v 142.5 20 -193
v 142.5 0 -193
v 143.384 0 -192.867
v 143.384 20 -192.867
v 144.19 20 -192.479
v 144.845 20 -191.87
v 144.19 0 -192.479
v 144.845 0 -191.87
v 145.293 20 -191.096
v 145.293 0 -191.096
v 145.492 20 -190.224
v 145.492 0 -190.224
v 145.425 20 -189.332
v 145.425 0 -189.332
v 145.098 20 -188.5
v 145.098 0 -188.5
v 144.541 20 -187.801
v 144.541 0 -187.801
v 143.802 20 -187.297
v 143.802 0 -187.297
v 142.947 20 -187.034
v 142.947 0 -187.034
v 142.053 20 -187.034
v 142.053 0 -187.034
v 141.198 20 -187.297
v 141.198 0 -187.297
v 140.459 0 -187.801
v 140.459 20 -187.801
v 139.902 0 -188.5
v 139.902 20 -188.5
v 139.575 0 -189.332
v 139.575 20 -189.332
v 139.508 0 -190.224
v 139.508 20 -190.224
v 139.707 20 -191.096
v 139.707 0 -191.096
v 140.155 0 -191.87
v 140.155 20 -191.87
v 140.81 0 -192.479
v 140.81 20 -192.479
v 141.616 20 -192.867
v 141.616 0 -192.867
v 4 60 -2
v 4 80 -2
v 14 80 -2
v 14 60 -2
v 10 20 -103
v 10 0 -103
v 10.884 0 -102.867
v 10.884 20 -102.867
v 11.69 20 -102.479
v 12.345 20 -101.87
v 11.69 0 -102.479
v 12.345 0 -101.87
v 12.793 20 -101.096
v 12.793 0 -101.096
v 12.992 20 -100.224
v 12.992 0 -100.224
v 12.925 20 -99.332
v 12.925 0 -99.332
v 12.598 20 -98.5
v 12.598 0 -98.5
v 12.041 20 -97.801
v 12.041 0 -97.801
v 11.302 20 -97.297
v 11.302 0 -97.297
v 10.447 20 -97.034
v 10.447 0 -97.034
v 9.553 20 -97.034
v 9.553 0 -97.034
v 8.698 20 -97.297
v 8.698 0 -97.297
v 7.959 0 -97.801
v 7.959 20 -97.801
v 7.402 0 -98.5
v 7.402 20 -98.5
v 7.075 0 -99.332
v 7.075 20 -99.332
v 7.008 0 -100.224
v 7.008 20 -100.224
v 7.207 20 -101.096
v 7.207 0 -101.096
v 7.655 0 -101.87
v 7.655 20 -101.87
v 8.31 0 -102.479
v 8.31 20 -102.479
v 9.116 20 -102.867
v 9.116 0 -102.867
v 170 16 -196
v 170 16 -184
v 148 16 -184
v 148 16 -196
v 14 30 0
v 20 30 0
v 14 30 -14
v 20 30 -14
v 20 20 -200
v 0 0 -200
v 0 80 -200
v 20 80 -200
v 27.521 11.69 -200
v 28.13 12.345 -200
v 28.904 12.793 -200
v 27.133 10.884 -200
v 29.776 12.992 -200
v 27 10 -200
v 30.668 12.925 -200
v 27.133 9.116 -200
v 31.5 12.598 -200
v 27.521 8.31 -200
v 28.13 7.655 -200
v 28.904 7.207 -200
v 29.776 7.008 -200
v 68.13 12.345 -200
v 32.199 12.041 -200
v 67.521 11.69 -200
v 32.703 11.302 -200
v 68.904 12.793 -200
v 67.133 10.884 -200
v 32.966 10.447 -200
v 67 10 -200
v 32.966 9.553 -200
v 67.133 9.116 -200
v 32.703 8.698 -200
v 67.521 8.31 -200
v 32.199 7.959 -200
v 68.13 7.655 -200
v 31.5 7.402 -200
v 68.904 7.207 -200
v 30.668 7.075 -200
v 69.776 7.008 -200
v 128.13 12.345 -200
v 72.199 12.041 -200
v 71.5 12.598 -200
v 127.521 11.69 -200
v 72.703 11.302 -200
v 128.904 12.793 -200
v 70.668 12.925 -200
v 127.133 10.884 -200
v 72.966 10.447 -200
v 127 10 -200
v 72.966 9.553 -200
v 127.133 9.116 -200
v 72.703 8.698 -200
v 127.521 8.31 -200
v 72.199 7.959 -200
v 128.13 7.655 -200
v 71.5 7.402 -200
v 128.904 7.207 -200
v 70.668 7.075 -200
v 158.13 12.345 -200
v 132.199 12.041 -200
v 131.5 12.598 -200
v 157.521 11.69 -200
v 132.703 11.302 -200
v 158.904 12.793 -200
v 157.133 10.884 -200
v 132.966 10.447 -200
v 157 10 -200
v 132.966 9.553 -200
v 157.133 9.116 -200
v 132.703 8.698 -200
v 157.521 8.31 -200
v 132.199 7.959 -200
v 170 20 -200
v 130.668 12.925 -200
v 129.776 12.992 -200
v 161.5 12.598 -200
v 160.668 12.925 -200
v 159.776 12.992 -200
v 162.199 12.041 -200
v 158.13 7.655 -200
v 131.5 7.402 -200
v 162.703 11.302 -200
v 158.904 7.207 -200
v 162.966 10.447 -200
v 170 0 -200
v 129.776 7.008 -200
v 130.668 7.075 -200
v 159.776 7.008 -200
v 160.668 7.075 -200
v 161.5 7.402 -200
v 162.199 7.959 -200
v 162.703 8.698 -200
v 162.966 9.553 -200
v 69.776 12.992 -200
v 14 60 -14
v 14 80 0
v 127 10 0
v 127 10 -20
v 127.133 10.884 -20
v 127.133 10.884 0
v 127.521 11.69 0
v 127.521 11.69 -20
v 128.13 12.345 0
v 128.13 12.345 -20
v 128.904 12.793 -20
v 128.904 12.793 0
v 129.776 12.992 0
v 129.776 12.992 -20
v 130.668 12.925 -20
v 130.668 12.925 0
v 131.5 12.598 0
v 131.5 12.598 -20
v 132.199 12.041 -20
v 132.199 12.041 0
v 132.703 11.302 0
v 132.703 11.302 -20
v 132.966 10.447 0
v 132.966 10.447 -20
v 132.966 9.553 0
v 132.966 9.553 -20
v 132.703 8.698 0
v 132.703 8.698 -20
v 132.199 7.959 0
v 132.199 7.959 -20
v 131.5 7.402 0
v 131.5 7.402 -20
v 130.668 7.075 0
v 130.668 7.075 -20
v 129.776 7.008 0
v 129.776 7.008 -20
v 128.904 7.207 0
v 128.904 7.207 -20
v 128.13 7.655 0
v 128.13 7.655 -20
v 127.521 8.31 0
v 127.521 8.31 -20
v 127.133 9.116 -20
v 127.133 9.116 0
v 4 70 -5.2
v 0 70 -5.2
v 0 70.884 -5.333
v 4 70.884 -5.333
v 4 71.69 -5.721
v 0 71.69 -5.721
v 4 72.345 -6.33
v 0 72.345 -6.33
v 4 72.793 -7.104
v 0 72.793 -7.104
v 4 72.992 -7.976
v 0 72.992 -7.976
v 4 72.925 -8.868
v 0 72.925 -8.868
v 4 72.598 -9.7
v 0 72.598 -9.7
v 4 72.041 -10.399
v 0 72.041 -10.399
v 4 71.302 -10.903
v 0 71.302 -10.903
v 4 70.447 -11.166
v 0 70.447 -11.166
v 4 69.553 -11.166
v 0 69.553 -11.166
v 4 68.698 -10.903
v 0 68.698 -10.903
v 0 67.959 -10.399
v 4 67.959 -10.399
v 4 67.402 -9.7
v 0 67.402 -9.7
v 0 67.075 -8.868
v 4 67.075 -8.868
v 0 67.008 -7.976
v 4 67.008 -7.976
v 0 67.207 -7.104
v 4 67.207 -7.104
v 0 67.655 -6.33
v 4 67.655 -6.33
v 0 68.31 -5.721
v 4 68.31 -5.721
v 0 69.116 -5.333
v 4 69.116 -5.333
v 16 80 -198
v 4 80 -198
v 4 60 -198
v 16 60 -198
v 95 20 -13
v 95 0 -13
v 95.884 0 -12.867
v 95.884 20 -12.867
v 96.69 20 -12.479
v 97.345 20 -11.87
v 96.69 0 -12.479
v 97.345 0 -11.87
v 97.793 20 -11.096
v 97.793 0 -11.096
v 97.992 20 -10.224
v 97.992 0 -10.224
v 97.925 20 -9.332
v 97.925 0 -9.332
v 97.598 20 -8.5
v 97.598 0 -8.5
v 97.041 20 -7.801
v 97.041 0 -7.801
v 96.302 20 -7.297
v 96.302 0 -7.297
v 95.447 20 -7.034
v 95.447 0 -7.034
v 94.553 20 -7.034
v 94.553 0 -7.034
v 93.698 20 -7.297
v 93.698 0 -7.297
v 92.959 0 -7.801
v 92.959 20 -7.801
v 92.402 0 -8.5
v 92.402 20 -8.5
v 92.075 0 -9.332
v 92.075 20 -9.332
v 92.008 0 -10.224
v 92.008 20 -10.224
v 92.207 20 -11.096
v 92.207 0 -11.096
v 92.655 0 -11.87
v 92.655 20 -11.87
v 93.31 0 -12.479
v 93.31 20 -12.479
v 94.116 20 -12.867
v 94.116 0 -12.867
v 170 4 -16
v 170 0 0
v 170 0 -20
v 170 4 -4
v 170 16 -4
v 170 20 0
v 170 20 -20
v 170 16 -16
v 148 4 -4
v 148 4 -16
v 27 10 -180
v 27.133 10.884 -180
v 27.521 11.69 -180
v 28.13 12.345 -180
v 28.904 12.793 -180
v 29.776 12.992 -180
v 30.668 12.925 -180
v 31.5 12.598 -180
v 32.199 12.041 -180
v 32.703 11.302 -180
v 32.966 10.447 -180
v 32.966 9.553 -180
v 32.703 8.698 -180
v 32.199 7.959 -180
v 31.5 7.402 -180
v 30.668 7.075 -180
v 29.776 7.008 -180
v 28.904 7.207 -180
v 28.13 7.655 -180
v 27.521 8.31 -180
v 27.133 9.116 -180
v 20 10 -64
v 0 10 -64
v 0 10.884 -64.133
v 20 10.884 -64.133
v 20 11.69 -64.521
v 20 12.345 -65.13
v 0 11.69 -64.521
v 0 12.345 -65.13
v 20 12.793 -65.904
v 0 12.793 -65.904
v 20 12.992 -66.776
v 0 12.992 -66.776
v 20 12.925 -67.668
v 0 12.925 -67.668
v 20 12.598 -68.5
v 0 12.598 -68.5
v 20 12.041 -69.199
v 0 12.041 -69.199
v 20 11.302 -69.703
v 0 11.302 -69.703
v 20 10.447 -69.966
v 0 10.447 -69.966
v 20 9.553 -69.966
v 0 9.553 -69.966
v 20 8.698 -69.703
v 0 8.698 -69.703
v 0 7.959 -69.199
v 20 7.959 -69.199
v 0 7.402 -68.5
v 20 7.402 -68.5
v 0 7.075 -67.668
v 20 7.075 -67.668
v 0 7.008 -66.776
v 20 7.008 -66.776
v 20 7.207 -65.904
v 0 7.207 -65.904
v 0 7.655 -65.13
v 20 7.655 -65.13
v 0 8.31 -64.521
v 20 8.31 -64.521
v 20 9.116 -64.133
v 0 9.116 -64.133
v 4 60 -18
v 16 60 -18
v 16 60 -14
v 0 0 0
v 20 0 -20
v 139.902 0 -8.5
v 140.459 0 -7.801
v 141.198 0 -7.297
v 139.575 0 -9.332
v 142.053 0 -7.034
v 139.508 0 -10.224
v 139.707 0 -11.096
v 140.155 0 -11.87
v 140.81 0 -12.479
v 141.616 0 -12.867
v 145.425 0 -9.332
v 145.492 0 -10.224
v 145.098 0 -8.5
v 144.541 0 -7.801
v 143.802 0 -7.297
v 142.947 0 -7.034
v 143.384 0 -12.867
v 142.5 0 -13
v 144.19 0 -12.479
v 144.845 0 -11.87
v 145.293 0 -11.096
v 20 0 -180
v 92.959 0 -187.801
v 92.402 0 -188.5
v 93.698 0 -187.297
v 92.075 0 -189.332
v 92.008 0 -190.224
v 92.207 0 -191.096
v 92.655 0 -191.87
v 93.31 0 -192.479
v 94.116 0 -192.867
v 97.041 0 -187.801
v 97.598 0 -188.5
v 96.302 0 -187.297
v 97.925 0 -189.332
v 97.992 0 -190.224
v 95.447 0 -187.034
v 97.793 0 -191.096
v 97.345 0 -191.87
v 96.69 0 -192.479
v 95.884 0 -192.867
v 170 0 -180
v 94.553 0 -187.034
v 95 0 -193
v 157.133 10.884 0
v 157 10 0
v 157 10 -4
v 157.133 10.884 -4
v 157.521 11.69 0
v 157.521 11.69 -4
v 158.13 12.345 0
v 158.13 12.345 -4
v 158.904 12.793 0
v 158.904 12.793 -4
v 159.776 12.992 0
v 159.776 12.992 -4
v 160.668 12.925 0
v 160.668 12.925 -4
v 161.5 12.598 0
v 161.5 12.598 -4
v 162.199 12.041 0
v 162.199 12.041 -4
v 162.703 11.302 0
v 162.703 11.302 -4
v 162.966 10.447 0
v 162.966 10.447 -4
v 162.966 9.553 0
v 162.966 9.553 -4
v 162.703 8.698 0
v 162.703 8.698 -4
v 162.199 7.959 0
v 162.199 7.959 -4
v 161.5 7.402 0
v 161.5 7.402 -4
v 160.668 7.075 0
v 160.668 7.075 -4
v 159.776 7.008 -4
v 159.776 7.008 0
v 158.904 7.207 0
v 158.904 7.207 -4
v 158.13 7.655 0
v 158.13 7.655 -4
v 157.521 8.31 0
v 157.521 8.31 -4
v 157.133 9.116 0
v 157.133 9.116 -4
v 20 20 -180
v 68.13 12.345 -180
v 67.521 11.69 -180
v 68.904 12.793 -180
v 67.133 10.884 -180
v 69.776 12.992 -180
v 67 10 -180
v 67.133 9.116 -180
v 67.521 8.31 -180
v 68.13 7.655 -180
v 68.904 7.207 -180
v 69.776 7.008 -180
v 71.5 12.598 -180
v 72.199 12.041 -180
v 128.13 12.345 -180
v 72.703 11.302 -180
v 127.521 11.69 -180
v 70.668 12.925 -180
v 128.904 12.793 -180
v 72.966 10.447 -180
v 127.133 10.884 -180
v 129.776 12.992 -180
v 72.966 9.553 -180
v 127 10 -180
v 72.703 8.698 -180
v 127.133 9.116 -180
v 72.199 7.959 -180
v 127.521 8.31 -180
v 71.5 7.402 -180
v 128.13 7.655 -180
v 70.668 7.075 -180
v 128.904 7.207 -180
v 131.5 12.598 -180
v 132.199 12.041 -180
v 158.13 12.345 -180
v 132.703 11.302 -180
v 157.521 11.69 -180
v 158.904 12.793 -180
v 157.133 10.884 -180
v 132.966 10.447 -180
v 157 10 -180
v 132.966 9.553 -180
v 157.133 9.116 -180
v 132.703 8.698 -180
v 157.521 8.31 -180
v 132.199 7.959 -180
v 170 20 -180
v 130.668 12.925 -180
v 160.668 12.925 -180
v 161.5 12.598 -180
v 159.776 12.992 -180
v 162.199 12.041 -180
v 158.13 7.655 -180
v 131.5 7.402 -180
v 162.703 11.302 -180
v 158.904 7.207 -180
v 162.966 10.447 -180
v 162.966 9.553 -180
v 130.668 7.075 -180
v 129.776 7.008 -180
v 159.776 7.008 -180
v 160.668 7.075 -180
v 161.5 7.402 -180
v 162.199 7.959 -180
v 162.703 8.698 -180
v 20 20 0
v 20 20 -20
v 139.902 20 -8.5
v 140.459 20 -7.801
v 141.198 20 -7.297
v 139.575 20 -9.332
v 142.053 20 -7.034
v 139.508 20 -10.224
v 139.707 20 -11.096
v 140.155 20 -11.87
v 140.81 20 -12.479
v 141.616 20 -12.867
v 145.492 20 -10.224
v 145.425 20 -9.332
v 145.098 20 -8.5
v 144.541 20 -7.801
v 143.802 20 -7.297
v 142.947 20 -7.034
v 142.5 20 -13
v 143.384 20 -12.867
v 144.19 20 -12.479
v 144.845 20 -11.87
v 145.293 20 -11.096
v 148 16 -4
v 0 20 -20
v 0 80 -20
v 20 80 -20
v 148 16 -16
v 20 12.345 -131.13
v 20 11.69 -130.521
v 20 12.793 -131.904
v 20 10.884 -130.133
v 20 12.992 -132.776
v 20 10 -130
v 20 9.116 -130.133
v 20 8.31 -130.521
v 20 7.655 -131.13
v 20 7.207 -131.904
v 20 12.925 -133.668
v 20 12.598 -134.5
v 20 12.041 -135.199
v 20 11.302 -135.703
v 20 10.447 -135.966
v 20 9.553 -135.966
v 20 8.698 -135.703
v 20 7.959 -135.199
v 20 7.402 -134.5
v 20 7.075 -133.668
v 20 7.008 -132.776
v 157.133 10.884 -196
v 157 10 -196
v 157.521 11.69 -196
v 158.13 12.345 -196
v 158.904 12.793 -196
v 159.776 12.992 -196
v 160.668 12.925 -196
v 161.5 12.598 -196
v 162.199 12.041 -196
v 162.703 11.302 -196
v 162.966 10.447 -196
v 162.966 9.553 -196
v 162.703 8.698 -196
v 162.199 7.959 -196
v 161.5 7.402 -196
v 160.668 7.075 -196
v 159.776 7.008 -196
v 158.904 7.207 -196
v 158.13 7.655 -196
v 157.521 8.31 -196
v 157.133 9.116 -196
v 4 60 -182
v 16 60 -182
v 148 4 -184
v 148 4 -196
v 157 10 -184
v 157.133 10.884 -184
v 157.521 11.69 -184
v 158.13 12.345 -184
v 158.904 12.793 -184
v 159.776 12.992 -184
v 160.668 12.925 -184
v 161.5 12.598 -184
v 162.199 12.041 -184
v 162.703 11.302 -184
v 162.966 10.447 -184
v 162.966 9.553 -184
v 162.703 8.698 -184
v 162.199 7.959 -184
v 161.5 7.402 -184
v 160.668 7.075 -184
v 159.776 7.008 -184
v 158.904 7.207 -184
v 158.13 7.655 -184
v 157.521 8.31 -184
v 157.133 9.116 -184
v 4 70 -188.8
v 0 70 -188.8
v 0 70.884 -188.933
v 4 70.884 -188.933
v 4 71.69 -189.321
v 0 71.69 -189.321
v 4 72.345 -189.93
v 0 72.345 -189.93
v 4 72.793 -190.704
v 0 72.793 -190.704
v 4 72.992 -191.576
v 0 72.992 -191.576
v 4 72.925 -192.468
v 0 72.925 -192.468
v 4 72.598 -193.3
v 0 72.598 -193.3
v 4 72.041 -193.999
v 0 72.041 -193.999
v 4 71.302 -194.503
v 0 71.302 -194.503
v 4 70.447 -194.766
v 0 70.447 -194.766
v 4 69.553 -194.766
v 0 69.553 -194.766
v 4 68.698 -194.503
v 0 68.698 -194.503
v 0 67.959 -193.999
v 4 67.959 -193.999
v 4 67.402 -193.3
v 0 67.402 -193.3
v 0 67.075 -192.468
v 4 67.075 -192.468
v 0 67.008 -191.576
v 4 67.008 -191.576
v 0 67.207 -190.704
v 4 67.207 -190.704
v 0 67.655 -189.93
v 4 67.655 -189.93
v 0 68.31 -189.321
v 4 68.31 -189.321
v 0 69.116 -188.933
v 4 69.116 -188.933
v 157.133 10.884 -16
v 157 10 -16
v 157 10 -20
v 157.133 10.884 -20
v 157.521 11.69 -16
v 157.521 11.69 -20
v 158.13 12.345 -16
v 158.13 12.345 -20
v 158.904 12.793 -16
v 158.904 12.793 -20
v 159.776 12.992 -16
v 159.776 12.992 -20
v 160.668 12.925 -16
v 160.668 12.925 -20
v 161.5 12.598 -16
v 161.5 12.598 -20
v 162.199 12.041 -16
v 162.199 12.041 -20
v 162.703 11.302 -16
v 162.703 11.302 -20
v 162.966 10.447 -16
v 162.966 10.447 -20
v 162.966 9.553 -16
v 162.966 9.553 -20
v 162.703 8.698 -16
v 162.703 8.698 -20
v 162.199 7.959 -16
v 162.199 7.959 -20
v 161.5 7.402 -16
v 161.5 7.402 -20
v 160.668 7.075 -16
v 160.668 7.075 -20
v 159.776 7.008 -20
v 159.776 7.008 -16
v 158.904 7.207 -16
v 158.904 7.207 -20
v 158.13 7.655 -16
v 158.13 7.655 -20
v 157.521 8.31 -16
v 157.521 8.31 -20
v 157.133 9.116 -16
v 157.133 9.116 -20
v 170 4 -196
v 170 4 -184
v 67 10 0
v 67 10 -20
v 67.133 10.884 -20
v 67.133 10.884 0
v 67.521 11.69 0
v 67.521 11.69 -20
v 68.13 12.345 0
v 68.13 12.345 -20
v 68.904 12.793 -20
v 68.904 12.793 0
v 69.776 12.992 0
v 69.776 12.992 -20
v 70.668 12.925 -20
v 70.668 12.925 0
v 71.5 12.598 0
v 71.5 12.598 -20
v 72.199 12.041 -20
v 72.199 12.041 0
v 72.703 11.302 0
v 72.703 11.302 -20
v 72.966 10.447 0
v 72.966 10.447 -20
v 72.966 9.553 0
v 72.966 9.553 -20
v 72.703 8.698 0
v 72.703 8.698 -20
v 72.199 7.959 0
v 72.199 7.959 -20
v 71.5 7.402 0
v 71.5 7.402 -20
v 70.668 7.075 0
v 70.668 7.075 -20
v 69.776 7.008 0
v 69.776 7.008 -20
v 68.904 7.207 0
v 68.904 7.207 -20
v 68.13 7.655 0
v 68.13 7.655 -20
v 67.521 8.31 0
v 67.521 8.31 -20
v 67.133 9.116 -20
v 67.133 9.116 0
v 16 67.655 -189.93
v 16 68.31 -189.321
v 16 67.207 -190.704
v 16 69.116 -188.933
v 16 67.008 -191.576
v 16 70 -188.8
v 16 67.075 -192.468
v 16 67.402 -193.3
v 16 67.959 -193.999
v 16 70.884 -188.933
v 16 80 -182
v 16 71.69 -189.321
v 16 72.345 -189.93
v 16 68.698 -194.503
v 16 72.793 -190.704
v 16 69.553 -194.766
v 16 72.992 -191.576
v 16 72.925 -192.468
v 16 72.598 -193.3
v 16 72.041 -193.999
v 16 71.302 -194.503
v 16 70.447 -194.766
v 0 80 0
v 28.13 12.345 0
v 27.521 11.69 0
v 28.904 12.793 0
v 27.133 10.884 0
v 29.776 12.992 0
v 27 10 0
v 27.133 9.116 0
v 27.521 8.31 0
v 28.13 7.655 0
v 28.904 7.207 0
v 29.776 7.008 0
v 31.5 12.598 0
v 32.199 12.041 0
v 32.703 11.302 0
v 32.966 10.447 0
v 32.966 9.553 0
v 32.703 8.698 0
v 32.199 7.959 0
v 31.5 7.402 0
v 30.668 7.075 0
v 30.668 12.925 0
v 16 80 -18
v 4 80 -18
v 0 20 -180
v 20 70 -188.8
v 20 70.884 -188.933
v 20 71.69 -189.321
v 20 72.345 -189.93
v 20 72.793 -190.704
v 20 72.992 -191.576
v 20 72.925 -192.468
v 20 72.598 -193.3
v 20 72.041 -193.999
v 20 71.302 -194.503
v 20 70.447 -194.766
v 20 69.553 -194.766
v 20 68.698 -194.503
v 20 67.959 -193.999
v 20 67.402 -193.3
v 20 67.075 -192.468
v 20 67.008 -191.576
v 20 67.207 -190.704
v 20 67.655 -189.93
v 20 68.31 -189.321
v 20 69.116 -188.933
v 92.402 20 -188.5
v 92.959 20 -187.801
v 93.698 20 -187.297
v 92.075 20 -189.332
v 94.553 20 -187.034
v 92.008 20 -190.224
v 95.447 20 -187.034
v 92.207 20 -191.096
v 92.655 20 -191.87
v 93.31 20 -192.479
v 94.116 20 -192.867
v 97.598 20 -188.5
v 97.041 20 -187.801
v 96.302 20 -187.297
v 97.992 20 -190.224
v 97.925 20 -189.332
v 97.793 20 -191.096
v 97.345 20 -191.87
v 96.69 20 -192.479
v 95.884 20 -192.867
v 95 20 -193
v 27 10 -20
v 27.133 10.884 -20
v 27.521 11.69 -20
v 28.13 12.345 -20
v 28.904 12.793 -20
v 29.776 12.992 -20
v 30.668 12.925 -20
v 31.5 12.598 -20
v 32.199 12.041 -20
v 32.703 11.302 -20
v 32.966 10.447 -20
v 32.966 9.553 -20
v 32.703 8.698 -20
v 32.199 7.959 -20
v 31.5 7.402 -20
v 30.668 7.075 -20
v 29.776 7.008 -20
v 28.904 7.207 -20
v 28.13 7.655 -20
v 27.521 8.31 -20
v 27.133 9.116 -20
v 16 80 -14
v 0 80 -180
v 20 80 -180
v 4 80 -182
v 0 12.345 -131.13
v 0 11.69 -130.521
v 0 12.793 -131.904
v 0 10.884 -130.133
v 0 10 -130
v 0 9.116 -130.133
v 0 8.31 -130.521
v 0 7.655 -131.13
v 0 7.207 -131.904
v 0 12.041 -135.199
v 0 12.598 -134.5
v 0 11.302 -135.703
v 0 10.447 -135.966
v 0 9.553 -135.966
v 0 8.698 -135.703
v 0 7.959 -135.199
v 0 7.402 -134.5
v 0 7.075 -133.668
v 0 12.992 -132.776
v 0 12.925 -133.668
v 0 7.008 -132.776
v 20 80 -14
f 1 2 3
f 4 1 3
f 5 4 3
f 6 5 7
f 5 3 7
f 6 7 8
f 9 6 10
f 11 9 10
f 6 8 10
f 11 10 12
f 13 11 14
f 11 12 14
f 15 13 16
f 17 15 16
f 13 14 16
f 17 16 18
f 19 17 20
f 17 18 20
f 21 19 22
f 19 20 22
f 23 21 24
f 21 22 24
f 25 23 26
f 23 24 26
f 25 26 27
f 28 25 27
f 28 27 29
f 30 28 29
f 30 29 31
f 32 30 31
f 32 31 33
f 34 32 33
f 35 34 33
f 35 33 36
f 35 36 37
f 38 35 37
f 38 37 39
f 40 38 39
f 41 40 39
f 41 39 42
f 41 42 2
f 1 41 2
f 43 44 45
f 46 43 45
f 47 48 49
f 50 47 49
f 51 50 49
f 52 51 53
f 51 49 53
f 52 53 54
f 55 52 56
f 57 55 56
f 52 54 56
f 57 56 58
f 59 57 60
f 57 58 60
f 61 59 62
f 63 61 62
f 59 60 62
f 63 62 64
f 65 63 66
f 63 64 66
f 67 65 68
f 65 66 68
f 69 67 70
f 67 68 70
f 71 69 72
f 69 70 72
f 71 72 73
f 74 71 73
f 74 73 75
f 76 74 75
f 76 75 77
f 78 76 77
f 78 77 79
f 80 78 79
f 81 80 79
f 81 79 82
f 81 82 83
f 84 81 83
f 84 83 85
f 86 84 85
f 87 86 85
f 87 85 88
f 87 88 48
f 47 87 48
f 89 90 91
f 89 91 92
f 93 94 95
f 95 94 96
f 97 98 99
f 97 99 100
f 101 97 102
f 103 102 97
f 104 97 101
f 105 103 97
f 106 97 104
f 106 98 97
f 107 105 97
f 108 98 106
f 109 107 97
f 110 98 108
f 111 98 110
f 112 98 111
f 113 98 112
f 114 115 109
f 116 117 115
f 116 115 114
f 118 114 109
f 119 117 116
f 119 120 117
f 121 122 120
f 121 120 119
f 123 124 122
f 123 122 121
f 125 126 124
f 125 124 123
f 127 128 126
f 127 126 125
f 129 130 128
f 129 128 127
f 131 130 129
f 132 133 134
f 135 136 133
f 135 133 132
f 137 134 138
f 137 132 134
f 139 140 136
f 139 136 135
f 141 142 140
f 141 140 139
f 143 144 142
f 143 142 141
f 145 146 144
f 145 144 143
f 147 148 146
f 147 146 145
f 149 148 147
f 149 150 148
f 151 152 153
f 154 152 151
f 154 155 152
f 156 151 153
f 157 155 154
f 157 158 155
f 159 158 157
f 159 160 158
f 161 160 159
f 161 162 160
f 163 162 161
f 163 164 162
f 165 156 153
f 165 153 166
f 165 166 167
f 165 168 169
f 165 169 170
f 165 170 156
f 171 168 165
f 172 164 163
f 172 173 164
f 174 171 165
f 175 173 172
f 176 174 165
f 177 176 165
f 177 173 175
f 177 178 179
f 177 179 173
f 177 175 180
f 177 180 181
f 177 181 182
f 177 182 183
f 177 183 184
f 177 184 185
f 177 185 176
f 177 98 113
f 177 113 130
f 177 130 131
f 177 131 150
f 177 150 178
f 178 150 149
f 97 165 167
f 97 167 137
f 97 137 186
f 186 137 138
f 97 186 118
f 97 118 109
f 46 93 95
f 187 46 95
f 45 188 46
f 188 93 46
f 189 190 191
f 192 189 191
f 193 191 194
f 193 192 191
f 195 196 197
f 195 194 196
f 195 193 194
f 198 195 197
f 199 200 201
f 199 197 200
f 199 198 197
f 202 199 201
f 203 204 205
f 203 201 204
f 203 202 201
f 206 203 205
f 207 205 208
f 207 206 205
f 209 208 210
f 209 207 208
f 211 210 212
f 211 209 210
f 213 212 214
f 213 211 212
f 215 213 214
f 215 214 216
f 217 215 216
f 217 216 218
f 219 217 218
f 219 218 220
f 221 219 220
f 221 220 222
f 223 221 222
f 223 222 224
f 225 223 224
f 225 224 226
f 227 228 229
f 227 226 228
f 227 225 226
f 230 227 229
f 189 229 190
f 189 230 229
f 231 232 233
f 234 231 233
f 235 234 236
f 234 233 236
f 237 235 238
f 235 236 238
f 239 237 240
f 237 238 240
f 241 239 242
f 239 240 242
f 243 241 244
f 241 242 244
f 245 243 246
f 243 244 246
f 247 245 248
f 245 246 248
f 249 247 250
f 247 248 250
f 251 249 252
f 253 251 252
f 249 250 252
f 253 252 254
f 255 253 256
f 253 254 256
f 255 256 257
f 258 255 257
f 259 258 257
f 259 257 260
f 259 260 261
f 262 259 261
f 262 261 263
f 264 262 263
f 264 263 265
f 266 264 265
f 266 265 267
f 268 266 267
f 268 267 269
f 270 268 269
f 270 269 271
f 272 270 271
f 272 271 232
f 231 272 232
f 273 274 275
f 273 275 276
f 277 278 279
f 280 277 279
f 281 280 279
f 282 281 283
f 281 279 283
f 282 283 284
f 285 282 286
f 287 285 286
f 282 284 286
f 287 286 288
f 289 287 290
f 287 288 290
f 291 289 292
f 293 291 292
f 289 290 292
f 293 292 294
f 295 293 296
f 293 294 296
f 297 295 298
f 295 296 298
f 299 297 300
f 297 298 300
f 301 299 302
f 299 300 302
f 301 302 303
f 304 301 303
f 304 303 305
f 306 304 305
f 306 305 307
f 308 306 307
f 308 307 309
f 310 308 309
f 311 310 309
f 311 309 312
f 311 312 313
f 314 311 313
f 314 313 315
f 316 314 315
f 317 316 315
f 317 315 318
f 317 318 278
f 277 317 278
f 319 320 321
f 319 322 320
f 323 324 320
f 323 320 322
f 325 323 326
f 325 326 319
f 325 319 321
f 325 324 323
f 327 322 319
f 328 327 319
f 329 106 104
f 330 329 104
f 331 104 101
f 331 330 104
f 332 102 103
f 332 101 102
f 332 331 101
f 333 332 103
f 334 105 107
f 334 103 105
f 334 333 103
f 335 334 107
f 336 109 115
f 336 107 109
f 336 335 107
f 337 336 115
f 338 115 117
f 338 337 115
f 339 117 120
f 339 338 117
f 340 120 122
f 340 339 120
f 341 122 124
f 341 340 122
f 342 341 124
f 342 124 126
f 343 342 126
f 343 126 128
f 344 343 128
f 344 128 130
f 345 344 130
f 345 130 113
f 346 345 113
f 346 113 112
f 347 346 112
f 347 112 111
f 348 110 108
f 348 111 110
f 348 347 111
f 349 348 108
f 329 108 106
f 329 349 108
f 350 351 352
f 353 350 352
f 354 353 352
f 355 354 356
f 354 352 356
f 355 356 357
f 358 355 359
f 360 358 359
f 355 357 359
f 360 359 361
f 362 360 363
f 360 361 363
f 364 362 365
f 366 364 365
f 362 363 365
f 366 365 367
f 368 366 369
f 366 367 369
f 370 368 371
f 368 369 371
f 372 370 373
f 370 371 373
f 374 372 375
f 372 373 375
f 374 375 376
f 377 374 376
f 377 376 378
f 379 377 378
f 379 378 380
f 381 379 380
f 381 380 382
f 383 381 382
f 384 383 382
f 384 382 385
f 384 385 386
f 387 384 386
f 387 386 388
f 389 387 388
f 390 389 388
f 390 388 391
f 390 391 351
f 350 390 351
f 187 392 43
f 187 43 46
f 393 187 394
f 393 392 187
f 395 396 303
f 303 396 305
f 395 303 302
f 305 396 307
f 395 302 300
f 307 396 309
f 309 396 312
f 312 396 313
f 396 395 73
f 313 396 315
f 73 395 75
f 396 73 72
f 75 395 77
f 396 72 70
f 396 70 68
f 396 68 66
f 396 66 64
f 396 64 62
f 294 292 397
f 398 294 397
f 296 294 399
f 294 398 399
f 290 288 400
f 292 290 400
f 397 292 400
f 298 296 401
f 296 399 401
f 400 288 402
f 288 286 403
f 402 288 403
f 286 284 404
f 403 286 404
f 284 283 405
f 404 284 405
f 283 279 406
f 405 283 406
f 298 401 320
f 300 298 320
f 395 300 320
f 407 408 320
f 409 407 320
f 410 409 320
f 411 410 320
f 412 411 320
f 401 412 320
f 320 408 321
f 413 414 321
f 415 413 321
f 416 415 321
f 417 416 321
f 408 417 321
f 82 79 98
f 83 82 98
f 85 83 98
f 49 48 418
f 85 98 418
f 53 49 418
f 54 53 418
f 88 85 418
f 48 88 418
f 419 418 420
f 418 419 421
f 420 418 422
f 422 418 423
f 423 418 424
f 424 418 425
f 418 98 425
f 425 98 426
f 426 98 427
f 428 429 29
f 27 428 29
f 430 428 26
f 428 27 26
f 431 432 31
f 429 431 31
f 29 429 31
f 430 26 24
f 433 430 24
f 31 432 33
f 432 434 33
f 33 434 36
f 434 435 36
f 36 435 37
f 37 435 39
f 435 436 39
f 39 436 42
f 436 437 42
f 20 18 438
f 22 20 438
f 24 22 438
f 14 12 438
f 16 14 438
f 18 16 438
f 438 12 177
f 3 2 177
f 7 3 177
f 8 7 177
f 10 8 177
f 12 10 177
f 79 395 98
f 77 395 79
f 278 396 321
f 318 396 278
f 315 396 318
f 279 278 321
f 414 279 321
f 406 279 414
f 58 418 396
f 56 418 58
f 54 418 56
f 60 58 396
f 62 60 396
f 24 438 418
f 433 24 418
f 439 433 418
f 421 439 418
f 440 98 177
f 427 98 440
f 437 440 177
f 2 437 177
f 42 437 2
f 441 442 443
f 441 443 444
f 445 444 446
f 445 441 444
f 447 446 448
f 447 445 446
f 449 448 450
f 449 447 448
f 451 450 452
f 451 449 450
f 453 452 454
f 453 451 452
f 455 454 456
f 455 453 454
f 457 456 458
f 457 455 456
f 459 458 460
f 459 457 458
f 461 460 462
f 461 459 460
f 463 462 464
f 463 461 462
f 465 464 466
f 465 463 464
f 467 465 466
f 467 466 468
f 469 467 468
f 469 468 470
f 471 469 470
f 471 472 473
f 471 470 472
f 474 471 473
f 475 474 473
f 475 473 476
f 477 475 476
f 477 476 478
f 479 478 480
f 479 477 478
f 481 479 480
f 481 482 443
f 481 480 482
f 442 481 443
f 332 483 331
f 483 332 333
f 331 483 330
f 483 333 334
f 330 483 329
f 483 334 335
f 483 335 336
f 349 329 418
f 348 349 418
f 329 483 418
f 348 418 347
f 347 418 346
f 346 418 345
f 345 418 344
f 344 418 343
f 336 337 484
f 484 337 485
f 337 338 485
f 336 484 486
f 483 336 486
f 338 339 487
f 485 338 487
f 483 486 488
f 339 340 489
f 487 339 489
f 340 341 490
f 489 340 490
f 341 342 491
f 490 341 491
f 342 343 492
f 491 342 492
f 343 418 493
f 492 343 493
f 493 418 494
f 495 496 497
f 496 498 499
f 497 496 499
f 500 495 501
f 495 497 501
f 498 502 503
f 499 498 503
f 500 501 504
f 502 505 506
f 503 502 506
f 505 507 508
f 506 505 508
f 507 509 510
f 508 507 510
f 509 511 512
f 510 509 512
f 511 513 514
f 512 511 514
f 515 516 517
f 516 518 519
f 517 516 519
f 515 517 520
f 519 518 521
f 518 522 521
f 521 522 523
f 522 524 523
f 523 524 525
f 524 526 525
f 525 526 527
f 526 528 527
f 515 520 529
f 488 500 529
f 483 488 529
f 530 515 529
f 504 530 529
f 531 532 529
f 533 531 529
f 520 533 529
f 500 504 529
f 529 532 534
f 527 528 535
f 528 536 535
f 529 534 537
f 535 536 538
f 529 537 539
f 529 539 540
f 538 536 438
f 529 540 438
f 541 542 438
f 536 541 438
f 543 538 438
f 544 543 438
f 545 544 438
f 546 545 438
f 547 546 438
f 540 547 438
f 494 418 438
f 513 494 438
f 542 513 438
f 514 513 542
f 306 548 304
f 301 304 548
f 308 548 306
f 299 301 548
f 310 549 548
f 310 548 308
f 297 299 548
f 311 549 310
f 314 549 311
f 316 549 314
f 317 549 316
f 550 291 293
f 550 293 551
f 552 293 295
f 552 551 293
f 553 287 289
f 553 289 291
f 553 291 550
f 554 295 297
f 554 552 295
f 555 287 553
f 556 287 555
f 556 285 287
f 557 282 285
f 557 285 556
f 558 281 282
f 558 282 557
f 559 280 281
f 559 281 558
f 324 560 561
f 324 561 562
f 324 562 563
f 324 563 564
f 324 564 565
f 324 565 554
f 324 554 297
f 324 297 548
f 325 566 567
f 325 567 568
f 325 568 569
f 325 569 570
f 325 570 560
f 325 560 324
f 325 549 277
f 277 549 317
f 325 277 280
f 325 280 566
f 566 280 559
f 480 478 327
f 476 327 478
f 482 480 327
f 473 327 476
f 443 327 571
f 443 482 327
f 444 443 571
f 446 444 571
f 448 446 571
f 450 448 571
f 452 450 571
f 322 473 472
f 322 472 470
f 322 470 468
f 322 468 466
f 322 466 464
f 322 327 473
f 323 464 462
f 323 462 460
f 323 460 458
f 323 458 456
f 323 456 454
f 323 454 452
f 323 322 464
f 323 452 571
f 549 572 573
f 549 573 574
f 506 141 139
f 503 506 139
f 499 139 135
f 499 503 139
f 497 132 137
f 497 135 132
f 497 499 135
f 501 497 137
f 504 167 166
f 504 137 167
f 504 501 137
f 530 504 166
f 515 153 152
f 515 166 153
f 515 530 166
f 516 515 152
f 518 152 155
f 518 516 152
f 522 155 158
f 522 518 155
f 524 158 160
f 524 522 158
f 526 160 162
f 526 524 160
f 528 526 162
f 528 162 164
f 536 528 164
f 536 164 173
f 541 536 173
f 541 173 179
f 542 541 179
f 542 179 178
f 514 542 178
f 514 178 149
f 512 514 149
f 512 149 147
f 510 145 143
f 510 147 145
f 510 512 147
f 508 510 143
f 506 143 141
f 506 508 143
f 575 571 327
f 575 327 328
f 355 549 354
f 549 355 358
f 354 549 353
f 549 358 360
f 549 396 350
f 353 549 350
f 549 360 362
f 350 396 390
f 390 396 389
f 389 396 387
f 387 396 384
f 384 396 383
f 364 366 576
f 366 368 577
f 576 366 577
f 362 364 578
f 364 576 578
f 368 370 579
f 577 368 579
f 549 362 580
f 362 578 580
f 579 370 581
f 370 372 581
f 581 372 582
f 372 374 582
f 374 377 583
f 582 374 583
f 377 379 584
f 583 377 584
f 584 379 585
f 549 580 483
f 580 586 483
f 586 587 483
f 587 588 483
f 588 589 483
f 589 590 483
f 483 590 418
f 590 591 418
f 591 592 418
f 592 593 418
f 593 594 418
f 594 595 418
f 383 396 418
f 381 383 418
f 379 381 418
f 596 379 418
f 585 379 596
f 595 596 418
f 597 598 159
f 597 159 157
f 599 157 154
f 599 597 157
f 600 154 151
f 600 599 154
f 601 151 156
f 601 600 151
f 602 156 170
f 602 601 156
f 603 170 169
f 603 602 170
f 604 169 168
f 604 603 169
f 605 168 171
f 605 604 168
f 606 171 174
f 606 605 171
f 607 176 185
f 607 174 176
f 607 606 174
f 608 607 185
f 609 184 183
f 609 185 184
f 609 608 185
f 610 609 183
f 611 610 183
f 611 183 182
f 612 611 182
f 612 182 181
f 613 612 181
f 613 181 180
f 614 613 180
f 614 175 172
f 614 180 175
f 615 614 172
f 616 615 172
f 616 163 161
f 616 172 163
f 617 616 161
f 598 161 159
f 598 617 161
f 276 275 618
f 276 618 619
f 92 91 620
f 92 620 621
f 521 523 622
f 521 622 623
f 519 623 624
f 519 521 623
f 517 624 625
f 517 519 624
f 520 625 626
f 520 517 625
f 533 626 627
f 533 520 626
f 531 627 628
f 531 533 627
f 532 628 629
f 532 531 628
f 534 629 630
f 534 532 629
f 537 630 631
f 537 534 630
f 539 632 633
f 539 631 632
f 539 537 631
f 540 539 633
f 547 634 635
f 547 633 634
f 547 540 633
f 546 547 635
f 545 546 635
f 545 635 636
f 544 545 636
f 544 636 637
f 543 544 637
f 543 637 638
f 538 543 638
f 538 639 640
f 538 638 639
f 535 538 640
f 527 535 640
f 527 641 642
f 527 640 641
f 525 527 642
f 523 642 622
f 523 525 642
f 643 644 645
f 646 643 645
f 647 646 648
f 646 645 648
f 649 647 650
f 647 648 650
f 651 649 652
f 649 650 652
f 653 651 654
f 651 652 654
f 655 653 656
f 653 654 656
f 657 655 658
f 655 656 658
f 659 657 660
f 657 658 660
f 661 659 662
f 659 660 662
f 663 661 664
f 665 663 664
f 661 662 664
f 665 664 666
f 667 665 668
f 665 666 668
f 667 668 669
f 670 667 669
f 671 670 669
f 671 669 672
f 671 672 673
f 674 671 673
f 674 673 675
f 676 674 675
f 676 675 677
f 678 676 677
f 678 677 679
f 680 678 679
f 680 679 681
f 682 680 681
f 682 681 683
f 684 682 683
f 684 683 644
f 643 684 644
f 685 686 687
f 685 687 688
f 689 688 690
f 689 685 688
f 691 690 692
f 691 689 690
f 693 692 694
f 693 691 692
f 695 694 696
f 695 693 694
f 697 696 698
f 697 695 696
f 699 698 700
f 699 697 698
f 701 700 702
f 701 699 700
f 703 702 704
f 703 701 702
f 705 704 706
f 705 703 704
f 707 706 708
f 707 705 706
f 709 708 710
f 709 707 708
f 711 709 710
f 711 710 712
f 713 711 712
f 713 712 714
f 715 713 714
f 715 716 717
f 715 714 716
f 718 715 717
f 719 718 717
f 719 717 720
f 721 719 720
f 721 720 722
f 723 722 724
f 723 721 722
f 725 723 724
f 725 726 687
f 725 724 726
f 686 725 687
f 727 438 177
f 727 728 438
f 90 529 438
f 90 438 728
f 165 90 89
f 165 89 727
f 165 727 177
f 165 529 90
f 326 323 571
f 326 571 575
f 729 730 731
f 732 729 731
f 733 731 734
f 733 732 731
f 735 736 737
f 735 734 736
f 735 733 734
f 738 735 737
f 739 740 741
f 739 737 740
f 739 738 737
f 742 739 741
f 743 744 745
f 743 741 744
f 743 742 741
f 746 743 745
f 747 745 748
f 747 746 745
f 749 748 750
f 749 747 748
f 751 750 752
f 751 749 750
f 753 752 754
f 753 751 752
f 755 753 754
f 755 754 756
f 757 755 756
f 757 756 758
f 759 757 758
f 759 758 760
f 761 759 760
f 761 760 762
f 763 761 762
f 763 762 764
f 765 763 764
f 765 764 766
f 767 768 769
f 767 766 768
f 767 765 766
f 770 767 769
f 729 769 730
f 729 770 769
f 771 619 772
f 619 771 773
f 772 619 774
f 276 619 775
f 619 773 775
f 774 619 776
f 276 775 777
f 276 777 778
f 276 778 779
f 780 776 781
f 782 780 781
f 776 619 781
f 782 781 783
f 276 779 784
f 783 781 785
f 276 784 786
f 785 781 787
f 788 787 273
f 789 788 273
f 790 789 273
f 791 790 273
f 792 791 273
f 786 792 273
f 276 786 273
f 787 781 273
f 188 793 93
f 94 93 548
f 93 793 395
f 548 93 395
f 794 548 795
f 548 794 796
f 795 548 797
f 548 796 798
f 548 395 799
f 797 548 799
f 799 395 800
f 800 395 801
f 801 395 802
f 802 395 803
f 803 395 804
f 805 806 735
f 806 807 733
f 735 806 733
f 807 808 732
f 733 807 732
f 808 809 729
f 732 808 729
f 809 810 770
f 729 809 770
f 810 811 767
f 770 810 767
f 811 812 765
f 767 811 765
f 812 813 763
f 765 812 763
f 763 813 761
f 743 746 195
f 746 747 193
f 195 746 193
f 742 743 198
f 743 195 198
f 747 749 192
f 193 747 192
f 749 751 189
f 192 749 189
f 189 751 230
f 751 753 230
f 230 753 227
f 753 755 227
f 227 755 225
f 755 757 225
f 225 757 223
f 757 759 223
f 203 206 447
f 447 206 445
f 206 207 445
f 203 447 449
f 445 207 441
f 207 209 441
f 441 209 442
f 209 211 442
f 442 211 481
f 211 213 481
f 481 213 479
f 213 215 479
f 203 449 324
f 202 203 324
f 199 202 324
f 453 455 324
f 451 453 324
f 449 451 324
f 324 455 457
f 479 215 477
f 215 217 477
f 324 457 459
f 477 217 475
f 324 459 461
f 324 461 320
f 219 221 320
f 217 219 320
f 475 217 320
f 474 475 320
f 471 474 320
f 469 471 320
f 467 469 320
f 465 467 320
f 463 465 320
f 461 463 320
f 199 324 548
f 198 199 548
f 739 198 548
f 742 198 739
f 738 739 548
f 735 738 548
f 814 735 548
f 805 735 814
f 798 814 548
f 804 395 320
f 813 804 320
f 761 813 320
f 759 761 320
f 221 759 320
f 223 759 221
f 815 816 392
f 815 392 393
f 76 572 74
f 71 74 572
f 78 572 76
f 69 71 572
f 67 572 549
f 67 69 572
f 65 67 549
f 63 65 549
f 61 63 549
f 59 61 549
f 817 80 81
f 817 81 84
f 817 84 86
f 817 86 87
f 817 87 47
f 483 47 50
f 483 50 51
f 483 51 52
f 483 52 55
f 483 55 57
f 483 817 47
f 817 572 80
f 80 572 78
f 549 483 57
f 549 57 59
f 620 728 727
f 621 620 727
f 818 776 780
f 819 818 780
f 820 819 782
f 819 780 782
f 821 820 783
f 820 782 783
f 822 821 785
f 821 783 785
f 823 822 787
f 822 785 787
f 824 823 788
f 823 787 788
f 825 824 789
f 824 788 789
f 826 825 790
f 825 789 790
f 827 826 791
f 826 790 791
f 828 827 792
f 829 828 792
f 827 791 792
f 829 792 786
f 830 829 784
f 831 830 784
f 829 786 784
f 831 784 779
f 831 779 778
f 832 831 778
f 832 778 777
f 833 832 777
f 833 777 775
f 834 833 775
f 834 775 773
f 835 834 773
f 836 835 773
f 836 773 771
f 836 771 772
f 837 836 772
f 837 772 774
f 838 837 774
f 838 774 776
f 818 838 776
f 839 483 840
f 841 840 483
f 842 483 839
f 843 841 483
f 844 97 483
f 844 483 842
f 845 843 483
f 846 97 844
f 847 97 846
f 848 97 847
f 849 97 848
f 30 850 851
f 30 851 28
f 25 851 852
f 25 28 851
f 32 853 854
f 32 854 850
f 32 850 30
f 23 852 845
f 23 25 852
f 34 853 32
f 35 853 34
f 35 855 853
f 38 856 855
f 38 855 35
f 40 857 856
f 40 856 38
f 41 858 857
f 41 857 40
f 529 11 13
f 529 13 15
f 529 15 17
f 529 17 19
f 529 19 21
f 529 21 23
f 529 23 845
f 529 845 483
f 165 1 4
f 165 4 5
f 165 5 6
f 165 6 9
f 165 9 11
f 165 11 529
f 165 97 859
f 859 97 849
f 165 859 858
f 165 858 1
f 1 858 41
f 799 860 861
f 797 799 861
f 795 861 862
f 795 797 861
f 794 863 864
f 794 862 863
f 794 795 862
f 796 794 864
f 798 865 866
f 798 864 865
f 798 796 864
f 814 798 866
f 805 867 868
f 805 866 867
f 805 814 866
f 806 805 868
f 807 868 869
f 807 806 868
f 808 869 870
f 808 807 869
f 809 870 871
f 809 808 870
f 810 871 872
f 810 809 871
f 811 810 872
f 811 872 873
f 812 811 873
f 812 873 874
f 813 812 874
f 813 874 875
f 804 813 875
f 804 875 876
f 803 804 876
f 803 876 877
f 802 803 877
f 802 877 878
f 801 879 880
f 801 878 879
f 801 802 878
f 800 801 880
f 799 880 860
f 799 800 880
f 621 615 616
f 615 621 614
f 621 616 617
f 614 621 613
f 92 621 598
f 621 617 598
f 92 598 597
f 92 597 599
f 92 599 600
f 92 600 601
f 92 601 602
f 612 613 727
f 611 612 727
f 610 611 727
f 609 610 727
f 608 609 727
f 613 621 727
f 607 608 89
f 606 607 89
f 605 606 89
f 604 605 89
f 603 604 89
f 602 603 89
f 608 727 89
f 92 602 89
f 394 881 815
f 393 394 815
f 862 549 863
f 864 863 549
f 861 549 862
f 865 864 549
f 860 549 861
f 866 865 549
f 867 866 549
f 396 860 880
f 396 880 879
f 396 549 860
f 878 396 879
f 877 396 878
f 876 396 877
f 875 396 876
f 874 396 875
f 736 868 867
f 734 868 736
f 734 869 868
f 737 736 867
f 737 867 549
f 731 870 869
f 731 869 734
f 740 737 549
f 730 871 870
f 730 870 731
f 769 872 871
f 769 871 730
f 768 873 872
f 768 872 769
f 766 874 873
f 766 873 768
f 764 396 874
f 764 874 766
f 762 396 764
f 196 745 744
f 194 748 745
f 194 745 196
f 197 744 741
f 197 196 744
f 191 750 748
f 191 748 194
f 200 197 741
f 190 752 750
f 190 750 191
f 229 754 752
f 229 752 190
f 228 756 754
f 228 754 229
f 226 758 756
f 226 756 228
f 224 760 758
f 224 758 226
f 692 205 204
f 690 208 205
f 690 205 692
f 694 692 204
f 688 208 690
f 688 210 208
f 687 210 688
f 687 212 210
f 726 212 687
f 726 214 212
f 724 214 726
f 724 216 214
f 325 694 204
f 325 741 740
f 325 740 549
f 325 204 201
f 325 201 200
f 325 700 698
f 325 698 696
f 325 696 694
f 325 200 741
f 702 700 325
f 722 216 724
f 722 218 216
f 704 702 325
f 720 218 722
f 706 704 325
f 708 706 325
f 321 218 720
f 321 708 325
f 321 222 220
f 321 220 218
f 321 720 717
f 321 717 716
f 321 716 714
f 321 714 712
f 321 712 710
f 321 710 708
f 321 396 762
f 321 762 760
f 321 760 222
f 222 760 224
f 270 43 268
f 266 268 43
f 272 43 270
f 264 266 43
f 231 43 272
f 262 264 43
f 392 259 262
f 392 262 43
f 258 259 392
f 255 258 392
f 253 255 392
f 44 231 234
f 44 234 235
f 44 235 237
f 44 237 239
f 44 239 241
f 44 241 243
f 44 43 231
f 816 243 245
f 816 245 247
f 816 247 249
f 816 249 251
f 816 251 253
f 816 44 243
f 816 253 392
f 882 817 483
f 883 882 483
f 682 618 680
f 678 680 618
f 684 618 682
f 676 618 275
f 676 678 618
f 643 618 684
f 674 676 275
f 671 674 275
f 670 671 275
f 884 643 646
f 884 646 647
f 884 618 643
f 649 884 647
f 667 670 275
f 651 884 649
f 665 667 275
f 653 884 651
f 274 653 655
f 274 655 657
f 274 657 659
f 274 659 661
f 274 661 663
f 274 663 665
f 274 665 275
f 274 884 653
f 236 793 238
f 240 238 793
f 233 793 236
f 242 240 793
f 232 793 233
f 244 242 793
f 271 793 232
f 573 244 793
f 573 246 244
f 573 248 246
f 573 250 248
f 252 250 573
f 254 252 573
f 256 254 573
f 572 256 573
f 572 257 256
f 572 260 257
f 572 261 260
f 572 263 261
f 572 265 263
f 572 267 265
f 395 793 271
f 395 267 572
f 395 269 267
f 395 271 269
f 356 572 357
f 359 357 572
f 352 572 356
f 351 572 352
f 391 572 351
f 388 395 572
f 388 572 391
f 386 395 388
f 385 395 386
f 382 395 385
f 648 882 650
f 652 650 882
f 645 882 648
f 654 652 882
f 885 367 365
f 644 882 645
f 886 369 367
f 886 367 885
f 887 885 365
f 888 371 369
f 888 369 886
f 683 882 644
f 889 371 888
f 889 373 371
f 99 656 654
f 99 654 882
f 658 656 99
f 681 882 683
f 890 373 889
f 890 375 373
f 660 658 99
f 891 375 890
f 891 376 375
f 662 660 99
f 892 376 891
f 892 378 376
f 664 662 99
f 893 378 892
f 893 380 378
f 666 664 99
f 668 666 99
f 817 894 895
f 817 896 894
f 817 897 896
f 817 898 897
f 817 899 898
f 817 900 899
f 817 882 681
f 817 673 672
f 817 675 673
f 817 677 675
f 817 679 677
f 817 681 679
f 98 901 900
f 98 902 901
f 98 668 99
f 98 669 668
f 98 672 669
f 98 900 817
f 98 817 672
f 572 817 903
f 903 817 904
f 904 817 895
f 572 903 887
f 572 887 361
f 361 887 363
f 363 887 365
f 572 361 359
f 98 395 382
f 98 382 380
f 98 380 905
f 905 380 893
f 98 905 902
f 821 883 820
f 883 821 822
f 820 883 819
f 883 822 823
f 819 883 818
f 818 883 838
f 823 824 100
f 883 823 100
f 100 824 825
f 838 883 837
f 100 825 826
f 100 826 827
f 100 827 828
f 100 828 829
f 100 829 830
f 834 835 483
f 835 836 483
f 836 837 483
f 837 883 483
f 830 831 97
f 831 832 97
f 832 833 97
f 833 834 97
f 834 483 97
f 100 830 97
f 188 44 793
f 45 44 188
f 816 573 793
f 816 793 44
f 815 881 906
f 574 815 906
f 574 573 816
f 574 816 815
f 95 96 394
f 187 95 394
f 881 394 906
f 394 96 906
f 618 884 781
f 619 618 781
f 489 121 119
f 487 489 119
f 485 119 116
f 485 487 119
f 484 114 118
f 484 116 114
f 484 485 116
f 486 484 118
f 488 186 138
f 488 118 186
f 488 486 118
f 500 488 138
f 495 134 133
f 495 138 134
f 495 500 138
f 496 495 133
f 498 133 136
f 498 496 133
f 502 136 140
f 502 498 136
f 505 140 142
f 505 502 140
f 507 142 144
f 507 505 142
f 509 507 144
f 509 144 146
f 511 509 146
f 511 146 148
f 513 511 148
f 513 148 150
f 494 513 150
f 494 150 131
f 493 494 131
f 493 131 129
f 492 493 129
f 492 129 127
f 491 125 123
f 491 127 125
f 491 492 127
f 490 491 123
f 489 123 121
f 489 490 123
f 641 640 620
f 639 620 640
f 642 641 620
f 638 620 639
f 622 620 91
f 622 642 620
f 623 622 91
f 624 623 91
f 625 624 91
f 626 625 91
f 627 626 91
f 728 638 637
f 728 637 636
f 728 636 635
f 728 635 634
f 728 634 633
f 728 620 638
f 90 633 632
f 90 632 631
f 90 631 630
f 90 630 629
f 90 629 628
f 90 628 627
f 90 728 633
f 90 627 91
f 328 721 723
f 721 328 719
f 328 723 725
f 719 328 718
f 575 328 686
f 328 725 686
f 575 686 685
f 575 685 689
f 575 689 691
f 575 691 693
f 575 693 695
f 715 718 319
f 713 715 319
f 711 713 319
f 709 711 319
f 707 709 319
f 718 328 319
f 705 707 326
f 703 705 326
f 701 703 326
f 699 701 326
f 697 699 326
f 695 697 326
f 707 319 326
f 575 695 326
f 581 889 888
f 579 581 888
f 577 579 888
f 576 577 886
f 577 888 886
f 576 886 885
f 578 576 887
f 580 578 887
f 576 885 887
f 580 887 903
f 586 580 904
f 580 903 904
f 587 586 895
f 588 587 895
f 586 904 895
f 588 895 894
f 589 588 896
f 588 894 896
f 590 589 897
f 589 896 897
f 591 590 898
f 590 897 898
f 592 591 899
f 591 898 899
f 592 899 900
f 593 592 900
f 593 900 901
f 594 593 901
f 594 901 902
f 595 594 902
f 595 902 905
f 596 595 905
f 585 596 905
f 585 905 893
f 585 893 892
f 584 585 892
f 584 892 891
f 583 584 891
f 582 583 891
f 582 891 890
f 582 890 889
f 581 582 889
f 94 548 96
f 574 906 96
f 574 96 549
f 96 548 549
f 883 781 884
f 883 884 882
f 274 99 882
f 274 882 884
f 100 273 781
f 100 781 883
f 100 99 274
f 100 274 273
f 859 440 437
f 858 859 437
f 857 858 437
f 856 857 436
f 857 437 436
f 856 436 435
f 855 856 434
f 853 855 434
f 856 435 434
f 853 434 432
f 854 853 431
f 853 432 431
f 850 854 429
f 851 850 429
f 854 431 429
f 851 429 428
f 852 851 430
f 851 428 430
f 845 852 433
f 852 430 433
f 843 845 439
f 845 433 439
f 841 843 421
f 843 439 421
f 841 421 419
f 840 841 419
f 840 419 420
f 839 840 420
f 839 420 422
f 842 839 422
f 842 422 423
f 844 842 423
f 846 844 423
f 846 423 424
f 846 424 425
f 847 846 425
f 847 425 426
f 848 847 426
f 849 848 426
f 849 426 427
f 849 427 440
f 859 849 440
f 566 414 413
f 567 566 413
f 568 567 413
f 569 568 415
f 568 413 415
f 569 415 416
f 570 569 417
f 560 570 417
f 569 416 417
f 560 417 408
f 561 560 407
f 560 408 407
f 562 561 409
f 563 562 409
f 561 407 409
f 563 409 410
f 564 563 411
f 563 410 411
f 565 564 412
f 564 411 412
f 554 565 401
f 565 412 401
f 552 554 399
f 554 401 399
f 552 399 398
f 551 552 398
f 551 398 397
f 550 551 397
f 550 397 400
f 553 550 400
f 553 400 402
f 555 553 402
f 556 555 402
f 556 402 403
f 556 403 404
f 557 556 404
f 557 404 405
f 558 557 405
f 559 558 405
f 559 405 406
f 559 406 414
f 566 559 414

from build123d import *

# Parameters (mm, degrees)
SKETCH1_W               = 320
SKETCH1_H               = 200
SKETCH1_W_2             = 280
SKETCH1_H_2             = 160
BOSS_EXTRUDE1_DEPTH     = 20
SKETCH2_W               = 150
SKETCH2_H               = 200
CUT_EXTRUDE1_DEPTH      = 20
SKETCH3_W               = 20
SKETCH3_H               = 20
BOSS_EXTRUDE2_DEPTH     = 60
SKETCH4_W               = 12
SKETCH4_H               = 16
CUT_EXTRUDE2_DEPTH      = 20
SKETCH5_W               = 12
SKETCH5_H               = 12
CUT_EXTRUDE3_DEPTH      = 22
CUT_EXTRUDE5_DEPTH      = 275.40845468
CUT_EXTRUDE5_DEPTH_BACK = 275.40845468
SKETCH8_R               = 3
SKETCH10_R              = 3
CUT_EXTRUDE6_DEPTH      = 30
SKETCH11_W              = 14
SKETCH11_H              = 50
CUT_EXTRUDE7_DEPTH      = 6
SKETCH12_R              = 3
CUT_EXTRUDE8_DEPTH      = 26
SKETCH13_R              = 3
CUT_EXTRUDE9_DEPTH      = 26


with BuildPart() as part:
    # Sketch1 → Boss-Extrude1 (new body)
    with BuildSketch(Plane(origin=(0, 0, 0), x_dir=(1, 0, 0), z_dir=(0, 1, 0))):
        with Locations((160, 100)):
            Rectangle(SKETCH1_W, SKETCH1_H)
        with Locations((160, 100)):
            Rectangle(SKETCH1_W_2, SKETCH1_H_2, mode=Mode.SUBTRACT)
    extrude(amount=BOSS_EXTRUDE1_DEPTH)

    # Sketch2 → Cut-Extrude1 (cut)
    with BuildSketch(Plane(origin=(0, 20, 0), x_dir=(1, 0, 0), z_dir=(0, 1, 0))):
        with Locations((245, 100)):
            Rectangle(SKETCH2_W, SKETCH2_H)
    extrude(amount=-CUT_EXTRUDE1_DEPTH, mode=Mode.SUBTRACT)

    # Sketch3 → Boss-Extrude2 (add)
    with BuildSketch(Plane(origin=(0, 20, 0), x_dir=(1, 0, 0), z_dir=(0, 1, 0))):
        with Locations((10, 10)):
            Rectangle(SKETCH3_W, SKETCH3_H)
        with Locations((10, 190)):
            Rectangle(SKETCH3_W, SKETCH3_H)
    extrude(amount=BOSS_EXTRUDE2_DEPTH)

    # Sketch4 → Cut-Extrude2 (cut)
    with BuildSketch(Plane(origin=(0, 80, 0), x_dir=(1, 0, 0), z_dir=(0, 1, 0))):
        with Locations((10, 10)):
            Rectangle(SKETCH4_W, SKETCH4_H)
        with Locations((10, 190)):
            Rectangle(SKETCH4_W, SKETCH4_H)
    extrude(amount=-CUT_EXTRUDE2_DEPTH, mode=Mode.SUBTRACT)

    # Sketch5 → Cut-Extrude3 (cut)
    with BuildSketch(Plane(origin=(170, 0, 0), x_dir=(0, 0, -1), z_dir=(1, 0, 0))):
        with Locations((10, 10)):
            Rectangle(SKETCH5_W, SKETCH5_H)
        with Locations((190, 10)):
            Rectangle(SKETCH5_W, SKETCH5_H)
    extrude(amount=-CUT_EXTRUDE3_DEPTH, mode=Mode.SUBTRACT)

    # Sketch8 → Cut-Extrude5 (cut, two sides: drawn at the far end of the back side and taken through both)
    with BuildSketch(Plane(origin=(0, 0, -200), x_dir=(-1, 0, 0), z_dir=(0, 0, -1)).offset(-CUT_EXTRUDE5_DEPTH_BACK)):
        with Locations((-30, 10)):
            Circle(SKETCH8_R)
        with Locations((-160, 10)):
            Circle(SKETCH8_R)
        with Locations((-70, 10)):
            Circle(SKETCH8_R)
        with Locations((-130, 10)):
            Circle(SKETCH8_R)
    extrude(amount=CUT_EXTRUDE5_DEPTH + CUT_EXTRUDE5_DEPTH_BACK, mode=Mode.SUBTRACT)

    # Sketch10 → Cut-Extrude6 (cut)
    with BuildSketch(Plane.XZ):
        with Locations(Location((142.5, -10, 0), (0, 0, 270))):
            Circle(SKETCH10_R)
        with Locations(Location((95, -10, 0), (0, 0, 270))):
            Circle(SKETCH10_R)
        with Locations(Location((10, -100, 0), (0, 0, 270))):
            Circle(SKETCH10_R)
        with Locations(Location((142.5, -190, 0), (0, 0, 270))):
            Circle(SKETCH10_R)
        with Locations(Location((95, -190, 0), (0, 0, 270))):
            Circle(SKETCH10_R)
    extrude(amount=-CUT_EXTRUDE6_DEPTH, mode=Mode.SUBTRACT)

    # Sketch11 → Cut-Extrude7 (cut)
    with BuildSketch(Plane(origin=(20, 0, 0), x_dir=(0, 0, -1), z_dir=(1, 0, 0))):
        with Locations((7, 55)):
            Rectangle(SKETCH11_W, SKETCH11_H)
    extrude(amount=-CUT_EXTRUDE7_DEPTH, mode=Mode.SUBTRACT)

    # Sketch12 → Cut-Extrude8 (cut)
    with BuildSketch(Plane.ZY):
        with Locations((-133, 10)):
            Circle(SKETCH12_R)
        with Locations((-67, 10)):
            Circle(SKETCH12_R)
    extrude(amount=-CUT_EXTRUDE8_DEPTH, mode=Mode.SUBTRACT)

    # Sketch13 → Cut-Extrude9 (cut)
    with BuildSketch(Plane.ZY):
        with Locations((-191.8, 70)):
            Circle(SKETCH13_R)
        with Locations((-8.2, 70)):
            Circle(SKETCH13_R)
    extrude(amount=-CUT_EXTRUDE9_DEPTH, mode=Mode.SUBTRACT)


solid = part.part
